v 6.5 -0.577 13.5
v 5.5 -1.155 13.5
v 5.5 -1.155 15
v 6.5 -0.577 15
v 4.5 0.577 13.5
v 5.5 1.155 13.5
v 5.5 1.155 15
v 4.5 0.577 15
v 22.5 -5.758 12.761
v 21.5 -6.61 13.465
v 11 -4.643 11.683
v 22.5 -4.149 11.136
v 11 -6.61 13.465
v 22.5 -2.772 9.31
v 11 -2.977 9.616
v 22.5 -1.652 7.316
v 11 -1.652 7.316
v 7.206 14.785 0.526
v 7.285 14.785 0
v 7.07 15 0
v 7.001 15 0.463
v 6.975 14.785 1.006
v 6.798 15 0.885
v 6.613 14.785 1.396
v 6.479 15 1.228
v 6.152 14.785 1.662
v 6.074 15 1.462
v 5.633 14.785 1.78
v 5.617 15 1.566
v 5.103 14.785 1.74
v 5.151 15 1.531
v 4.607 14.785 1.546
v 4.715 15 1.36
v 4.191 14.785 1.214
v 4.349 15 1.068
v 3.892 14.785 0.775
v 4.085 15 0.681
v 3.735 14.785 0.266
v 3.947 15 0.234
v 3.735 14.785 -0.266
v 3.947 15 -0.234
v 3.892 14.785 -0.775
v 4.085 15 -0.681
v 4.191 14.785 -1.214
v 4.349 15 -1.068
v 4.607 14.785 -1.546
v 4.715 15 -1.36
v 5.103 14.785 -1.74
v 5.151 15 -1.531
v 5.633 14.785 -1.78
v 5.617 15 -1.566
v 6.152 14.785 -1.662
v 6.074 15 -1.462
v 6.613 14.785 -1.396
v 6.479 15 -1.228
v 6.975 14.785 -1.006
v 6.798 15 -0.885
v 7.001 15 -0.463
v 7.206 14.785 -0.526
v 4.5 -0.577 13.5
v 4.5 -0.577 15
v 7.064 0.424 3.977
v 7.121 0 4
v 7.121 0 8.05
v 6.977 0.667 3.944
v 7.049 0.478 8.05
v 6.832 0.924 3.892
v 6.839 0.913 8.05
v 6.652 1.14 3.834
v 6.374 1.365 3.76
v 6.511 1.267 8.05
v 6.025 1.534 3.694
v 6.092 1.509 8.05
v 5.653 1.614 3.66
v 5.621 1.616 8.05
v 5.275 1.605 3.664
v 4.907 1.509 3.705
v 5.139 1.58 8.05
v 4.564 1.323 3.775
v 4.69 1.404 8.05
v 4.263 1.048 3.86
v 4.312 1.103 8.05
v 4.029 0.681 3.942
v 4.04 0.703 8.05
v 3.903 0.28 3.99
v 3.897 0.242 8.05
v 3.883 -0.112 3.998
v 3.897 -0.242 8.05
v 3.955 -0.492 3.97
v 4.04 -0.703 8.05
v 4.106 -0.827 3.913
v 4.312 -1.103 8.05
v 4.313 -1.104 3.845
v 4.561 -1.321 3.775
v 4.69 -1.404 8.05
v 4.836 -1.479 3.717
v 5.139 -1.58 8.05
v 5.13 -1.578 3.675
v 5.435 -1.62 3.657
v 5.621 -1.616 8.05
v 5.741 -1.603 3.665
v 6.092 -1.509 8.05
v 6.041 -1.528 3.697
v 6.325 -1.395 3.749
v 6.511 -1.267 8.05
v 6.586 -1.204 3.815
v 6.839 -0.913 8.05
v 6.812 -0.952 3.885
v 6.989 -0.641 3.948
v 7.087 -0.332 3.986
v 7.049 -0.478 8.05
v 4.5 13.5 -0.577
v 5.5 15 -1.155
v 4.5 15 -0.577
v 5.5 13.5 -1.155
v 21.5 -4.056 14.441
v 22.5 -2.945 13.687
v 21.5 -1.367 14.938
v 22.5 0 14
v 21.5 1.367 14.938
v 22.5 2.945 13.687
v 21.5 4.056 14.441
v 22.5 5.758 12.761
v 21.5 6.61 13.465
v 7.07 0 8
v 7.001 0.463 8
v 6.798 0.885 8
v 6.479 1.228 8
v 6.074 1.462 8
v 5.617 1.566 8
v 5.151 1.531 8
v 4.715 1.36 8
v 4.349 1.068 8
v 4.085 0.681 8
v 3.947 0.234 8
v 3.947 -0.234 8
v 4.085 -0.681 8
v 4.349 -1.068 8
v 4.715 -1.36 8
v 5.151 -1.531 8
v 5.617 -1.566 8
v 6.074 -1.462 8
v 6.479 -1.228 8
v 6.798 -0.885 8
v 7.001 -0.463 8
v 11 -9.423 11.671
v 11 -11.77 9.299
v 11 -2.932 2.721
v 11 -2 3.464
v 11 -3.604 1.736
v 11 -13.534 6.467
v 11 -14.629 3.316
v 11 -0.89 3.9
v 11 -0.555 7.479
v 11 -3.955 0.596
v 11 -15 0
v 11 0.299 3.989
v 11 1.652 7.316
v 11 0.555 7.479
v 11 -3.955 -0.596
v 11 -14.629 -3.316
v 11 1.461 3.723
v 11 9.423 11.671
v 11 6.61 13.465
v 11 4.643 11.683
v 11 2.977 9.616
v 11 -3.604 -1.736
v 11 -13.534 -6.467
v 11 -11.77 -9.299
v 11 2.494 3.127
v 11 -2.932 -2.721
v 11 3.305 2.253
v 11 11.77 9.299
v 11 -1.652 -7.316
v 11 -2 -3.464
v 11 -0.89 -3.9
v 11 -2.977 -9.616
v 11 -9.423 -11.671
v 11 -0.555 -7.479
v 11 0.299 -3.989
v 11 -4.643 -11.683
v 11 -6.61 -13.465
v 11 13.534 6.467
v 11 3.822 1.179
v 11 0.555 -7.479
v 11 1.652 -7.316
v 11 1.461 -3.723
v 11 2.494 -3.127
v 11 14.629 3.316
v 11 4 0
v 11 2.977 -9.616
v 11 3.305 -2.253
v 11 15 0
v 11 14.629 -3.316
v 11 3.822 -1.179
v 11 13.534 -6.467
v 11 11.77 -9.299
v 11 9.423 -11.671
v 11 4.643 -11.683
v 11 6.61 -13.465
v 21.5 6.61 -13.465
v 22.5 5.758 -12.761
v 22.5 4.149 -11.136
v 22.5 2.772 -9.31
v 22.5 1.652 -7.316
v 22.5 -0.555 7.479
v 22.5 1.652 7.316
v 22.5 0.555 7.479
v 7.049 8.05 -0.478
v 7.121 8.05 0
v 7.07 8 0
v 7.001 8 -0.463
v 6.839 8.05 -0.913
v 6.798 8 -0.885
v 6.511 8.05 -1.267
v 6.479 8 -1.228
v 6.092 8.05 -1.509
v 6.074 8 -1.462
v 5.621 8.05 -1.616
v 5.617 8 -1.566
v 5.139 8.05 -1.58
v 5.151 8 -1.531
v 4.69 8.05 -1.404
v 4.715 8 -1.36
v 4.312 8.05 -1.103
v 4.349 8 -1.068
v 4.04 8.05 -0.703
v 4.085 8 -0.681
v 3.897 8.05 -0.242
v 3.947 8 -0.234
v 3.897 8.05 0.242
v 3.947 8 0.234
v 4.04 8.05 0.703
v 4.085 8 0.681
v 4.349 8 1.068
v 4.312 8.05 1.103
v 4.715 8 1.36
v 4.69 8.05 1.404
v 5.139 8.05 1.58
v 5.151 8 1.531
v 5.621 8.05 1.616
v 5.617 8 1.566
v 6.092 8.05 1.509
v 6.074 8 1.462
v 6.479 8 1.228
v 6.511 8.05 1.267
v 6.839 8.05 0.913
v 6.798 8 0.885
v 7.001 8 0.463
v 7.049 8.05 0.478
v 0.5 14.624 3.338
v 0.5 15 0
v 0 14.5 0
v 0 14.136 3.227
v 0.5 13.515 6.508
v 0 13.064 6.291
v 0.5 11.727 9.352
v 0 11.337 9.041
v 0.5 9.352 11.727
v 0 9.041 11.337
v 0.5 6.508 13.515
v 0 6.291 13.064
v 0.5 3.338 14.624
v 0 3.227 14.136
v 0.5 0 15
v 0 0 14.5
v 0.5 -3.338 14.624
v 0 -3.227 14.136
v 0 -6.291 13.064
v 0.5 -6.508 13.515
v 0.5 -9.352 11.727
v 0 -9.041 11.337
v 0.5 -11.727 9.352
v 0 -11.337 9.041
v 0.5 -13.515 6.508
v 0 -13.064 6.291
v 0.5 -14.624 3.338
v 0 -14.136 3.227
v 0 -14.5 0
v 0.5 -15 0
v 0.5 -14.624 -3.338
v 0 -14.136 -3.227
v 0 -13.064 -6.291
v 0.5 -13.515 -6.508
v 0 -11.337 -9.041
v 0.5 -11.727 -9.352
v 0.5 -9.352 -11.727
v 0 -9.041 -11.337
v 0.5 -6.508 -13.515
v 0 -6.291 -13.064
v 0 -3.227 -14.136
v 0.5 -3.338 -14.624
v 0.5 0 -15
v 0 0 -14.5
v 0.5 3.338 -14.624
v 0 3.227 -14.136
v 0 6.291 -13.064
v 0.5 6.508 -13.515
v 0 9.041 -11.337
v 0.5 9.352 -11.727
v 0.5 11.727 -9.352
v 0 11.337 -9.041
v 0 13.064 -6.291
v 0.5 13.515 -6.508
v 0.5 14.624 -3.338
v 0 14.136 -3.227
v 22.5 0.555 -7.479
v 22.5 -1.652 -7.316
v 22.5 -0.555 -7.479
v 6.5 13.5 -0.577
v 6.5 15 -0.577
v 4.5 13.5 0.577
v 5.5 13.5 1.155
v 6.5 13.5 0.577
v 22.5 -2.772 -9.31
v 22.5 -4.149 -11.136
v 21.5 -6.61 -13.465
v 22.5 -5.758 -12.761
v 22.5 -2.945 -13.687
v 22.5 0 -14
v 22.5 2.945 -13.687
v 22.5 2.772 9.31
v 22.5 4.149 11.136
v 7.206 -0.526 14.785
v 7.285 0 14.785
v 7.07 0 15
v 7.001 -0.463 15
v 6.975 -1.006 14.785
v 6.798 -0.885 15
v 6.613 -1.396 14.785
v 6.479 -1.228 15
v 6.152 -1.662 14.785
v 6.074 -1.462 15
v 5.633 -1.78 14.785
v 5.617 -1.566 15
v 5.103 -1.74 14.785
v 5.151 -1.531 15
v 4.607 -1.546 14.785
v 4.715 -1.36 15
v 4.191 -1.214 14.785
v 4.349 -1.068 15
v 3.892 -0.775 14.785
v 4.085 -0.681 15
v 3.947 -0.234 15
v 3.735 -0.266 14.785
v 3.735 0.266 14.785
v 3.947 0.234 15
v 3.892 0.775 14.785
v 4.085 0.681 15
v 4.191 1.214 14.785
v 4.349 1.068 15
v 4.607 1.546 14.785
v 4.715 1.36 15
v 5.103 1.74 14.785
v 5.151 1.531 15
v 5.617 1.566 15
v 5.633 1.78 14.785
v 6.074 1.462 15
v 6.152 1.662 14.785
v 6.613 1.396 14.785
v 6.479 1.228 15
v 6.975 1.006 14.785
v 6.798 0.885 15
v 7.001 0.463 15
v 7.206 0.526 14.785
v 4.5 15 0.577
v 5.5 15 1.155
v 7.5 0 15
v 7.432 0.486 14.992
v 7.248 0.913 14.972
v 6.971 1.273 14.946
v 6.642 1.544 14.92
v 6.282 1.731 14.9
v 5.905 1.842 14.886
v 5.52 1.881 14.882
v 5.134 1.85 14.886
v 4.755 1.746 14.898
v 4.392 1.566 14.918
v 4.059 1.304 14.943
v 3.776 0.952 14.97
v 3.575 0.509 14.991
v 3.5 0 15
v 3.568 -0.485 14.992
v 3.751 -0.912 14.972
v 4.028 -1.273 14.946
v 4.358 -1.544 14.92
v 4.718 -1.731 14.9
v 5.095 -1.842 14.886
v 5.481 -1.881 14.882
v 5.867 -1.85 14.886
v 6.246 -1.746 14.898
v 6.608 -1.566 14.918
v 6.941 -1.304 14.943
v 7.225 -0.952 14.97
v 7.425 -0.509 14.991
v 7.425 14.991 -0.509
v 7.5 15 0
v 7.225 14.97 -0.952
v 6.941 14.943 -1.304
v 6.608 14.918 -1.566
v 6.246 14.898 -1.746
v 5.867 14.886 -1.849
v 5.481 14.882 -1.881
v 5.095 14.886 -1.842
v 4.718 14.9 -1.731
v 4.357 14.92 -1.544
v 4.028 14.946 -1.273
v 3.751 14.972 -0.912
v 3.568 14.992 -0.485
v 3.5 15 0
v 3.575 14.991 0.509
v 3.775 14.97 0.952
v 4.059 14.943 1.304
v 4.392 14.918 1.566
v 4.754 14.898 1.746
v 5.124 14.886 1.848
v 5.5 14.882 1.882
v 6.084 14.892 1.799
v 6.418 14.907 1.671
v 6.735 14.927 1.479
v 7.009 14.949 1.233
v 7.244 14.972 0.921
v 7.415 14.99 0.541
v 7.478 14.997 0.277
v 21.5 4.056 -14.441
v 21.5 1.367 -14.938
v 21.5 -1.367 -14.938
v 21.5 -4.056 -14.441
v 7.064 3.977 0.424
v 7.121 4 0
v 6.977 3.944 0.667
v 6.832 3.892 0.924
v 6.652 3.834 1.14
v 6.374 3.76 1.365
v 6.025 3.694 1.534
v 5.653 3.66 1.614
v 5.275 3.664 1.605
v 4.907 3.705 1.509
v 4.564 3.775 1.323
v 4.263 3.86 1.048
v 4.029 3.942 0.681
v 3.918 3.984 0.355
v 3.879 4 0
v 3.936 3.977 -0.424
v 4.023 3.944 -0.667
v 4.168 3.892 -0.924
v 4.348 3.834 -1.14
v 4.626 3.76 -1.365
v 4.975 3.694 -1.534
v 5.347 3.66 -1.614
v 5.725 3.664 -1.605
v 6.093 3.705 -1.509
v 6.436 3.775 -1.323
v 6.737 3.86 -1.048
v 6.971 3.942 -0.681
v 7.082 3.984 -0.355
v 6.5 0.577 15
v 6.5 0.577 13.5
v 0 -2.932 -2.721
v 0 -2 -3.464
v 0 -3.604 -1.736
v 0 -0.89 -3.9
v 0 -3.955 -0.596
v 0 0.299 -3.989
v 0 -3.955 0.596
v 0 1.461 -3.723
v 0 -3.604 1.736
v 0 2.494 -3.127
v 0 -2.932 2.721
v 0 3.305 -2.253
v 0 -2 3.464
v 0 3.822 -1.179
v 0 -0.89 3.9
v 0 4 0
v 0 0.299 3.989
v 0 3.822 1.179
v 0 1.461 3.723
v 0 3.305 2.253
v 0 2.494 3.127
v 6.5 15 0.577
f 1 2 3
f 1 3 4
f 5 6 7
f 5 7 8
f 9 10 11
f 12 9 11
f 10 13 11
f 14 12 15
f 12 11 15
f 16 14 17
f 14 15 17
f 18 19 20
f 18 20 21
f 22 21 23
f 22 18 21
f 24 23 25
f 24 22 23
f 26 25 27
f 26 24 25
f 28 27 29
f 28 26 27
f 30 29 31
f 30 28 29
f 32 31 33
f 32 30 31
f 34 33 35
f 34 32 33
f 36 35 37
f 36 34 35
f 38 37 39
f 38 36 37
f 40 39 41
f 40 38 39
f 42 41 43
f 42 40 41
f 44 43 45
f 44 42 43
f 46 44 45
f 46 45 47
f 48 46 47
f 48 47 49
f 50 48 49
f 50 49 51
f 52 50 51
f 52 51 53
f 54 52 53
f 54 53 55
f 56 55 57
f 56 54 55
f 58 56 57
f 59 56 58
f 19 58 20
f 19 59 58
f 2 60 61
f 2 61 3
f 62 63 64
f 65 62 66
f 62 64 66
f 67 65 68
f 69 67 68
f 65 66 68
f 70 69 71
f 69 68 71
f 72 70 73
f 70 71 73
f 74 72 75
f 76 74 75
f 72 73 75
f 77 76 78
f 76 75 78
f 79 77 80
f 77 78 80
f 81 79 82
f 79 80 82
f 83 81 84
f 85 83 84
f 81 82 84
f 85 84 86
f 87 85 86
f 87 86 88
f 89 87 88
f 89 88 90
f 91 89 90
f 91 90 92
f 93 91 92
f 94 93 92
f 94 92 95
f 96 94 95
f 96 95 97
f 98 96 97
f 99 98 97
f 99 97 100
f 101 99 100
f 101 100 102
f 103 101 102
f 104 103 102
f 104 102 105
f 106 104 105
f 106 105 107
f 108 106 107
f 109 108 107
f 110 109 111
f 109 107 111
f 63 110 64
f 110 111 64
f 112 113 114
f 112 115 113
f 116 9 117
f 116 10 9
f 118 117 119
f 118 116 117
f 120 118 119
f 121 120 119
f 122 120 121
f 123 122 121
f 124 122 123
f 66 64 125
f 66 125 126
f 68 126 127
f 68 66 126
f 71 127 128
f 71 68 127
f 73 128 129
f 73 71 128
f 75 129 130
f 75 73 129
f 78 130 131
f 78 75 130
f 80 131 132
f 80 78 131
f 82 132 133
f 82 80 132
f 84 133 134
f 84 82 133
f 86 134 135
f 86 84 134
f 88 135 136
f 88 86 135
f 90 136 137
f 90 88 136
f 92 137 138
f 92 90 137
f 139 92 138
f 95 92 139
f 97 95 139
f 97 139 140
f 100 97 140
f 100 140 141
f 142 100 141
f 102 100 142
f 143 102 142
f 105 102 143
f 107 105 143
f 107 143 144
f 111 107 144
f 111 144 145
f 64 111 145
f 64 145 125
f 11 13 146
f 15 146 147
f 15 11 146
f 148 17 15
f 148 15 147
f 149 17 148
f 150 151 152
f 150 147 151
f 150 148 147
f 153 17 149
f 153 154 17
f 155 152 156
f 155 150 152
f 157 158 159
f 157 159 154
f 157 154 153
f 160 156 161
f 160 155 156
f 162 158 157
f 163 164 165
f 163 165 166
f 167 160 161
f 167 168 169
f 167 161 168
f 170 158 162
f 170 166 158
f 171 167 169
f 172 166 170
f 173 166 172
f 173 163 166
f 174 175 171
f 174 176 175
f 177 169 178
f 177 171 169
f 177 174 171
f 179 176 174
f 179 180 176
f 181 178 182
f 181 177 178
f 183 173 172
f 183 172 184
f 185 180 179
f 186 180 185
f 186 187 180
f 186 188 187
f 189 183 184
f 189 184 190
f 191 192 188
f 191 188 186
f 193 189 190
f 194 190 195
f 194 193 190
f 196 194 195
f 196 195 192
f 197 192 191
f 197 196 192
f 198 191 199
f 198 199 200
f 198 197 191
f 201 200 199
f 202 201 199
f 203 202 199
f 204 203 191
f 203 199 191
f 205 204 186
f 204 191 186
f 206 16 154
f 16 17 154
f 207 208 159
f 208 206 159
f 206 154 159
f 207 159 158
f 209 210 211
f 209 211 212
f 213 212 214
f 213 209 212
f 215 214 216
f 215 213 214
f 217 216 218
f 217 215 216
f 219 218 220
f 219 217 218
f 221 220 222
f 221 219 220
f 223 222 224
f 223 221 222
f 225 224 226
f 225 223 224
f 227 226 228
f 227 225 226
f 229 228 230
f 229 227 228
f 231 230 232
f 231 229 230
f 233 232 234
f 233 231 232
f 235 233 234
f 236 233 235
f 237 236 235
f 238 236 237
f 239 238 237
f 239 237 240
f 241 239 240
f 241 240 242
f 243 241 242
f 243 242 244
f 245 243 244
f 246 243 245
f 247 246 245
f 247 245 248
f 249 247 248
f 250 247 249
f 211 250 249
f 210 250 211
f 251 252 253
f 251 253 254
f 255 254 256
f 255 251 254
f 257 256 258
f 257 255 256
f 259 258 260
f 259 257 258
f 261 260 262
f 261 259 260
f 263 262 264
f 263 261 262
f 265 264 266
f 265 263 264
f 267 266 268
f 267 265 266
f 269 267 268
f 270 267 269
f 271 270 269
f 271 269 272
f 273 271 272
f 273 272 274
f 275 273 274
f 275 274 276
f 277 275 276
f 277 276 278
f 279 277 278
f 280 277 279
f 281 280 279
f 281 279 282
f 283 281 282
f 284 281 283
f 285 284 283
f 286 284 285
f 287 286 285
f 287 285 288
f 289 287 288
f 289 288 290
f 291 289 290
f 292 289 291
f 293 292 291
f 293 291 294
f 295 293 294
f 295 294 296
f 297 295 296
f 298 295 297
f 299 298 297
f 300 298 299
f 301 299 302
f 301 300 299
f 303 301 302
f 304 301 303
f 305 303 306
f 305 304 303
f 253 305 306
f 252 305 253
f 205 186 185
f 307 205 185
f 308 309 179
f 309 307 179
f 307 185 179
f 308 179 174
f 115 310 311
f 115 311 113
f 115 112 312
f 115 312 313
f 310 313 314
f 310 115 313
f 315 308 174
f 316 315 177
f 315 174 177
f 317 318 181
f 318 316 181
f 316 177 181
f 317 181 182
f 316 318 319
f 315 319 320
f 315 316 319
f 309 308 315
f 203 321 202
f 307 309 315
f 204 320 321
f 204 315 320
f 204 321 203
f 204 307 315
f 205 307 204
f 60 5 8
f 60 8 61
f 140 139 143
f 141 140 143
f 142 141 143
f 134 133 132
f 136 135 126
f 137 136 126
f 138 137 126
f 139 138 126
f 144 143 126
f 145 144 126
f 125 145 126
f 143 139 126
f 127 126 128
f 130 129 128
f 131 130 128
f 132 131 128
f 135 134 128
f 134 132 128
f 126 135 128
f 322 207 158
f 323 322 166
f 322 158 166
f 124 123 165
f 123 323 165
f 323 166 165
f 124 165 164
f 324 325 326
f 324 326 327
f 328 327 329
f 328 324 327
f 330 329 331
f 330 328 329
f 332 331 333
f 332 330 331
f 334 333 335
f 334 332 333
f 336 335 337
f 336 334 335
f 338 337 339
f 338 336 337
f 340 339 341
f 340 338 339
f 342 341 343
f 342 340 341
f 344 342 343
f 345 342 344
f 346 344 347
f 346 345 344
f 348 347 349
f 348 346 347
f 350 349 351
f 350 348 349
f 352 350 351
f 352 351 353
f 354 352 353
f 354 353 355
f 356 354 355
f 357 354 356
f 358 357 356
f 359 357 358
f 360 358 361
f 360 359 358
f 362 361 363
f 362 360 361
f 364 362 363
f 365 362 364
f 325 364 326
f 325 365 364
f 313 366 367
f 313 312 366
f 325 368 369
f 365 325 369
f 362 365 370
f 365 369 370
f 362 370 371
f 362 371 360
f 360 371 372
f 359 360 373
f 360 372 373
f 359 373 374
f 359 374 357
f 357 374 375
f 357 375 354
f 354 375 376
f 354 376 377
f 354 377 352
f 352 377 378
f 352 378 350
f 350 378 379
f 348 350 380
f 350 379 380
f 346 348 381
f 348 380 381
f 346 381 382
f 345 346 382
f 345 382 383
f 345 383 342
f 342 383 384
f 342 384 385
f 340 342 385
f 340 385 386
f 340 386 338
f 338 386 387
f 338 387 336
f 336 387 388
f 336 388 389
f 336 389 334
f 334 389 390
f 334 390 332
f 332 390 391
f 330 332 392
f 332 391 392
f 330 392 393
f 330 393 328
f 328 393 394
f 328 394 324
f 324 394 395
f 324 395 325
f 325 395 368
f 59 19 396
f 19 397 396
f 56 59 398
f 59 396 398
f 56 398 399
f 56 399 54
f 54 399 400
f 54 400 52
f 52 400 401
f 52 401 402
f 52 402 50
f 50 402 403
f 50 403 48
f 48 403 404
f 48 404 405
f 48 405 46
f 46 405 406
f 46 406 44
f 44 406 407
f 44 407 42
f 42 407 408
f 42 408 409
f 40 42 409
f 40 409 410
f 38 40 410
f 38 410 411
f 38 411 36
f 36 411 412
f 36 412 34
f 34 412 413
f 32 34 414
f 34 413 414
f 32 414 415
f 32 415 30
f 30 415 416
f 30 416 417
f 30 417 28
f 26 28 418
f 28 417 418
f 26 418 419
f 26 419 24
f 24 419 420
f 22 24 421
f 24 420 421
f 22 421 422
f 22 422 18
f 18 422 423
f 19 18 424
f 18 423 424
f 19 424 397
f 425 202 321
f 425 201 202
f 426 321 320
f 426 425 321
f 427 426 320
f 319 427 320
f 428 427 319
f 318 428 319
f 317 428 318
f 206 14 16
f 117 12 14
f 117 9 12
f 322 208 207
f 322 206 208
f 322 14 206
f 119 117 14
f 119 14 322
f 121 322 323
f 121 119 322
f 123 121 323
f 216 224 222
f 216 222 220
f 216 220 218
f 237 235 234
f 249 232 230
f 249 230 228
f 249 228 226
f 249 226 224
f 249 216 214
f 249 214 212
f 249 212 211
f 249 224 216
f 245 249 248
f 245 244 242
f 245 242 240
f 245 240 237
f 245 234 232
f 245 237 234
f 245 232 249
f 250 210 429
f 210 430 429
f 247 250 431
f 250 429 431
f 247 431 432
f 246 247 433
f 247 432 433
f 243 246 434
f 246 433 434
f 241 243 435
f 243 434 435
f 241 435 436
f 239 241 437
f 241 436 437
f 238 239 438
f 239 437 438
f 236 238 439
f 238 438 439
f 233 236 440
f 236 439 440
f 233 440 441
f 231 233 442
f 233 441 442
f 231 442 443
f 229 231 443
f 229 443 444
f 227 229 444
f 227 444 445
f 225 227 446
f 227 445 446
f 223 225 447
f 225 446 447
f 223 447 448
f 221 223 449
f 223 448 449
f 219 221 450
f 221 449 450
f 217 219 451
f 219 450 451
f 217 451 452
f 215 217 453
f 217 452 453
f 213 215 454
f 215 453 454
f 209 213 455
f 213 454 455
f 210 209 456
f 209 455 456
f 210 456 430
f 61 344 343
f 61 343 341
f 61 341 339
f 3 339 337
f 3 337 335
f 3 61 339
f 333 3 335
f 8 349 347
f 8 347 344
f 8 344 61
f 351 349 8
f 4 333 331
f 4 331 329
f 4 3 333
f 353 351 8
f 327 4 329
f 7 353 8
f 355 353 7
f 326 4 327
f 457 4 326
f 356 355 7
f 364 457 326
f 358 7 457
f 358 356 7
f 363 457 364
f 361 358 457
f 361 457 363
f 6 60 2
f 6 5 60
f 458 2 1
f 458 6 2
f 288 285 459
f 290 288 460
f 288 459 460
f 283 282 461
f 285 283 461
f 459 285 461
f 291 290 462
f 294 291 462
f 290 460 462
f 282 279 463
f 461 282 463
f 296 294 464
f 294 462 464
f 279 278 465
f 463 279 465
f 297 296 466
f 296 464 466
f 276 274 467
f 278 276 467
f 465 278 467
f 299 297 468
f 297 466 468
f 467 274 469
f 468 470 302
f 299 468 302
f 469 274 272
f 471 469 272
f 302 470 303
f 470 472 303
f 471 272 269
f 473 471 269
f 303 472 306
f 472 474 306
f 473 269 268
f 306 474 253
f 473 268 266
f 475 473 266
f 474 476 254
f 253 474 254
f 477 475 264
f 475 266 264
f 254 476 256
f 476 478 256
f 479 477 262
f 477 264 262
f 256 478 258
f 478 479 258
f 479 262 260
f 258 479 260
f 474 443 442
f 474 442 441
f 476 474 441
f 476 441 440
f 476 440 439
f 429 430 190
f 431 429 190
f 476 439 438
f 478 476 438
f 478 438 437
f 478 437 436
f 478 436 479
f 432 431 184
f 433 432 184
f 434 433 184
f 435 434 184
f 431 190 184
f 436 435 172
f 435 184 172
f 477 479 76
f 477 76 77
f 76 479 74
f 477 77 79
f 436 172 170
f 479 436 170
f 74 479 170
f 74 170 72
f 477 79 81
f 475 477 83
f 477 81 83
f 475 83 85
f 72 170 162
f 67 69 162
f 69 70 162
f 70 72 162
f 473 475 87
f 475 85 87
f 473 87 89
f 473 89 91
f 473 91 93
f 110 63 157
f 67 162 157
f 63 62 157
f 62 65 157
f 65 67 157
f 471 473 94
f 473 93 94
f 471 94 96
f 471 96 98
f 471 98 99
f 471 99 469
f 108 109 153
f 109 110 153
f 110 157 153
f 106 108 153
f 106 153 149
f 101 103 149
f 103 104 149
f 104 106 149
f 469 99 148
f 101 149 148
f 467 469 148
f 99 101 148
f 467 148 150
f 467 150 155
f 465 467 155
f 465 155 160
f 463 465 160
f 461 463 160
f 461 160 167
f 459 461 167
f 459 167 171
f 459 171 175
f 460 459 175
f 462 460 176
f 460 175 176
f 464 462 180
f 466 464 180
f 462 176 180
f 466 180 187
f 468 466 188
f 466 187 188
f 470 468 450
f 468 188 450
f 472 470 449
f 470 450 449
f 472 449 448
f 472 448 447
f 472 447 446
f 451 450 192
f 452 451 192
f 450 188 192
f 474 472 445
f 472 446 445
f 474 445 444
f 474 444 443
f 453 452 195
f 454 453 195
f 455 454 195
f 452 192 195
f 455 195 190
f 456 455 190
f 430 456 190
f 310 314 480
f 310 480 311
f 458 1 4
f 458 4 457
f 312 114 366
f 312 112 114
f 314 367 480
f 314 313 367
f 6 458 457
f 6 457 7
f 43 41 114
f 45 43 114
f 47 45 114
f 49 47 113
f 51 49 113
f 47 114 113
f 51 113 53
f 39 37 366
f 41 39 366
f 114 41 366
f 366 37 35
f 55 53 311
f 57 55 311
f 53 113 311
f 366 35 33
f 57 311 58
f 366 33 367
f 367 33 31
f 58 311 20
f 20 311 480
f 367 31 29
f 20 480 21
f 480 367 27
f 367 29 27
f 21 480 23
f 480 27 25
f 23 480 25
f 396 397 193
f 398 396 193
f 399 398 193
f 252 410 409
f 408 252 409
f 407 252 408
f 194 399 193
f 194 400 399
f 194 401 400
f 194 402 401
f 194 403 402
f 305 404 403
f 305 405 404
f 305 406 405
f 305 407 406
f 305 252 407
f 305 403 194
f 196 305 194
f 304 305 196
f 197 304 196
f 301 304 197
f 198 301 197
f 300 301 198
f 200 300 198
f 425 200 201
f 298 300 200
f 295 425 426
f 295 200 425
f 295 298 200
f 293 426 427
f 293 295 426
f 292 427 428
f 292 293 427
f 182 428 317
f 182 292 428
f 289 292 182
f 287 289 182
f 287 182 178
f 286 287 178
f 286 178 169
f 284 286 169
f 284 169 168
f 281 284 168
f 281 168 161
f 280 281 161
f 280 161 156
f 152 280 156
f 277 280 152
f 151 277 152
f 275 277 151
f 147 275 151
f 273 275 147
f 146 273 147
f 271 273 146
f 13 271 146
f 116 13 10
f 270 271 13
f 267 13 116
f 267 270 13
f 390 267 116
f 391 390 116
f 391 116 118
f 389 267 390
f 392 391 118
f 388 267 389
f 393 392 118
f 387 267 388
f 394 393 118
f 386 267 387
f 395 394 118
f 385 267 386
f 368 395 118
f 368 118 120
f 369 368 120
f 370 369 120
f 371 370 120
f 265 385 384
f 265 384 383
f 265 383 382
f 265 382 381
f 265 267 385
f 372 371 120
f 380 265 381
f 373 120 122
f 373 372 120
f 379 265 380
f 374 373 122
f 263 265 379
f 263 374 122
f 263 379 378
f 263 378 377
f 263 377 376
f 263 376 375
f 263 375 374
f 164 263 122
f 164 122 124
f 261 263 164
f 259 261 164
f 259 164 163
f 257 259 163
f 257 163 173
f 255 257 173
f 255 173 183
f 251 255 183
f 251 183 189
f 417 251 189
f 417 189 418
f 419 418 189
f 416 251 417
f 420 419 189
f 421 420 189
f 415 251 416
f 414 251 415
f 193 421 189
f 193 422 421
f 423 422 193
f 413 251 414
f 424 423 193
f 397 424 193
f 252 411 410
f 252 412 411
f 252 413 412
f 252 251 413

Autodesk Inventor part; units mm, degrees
sketch "Sketch_1" plane through (0, 0, 0) normal (0, 0, 1) x (1, 0, 0)
  line L0 (22.5, 0) -> (0, 0)
  line L1 (0, 14.5) -> (0, 4)
  line L2 (0, 4) -> (22.5, 4)
  line L3 (22.5, 4) -> (22.5, 14)
  line L4 (22.5, 14) -> (21.5, 15)
  line L5 (21.5, 15) -> (0.5, 15)
  line L6 (0.5, 15) -> (0, 14.5)
revolve "Revolution1" add sketch "Sketch_1" angle 360 about axis through (22.5, 0, 0) along (1, 0, 0)
sketch "Sketch_2" plane through (11, 0, 0) normal (1, 0, 0) x (0, 0, -1)
  arc A0 (-13.4651, -6.61) -> (13.4651, -6.61) centre (0, 0) ccw
  arc A1 (13.4651, -6.61) -> (7.3157, -1.6525) centre (0, -17.0197) ccw
  arc A2 (7.3157, -1.6525) -> (7.3157, 1.6525) centre (0, 0) ccw
  arc A3 (7.3157, 1.6525) -> (13.4651, 6.61) centre (0, 17.0197) ccw
  arc A4 (13.4651, 6.61) -> (-13.4651, 6.61) centre (0, 0) ccw
  arc A5 (-13.4651, 6.61) -> (-7.3157, 1.6525) centre (0, 17.0197) ccw
  arc A6 (-7.3157, 1.6525) -> (-7.3157, -1.6525) centre (0, 0) ccw
  arc A7 (-7.3157, -1.6525) -> (-13.4651, -6.61) centre (0, -17.0197) ccw
extrude "Extrusion1" cut sketch "Sketch_2" along normal blind 11.5
sketch "Sketch_7" plane through (0, 0, 0) normal (0, 0, 1) x (1, 0, 0)
  line L0 (5.5, 0) -> (5.5, 15)
  line L1 (5.5, 15) -> (7.5, 15)
  line L2 (7.5, 15) -> (7.121, 14.621)
  line L3 (7.121, 14.621) -> (7.121, 0.379)
  line L4 (7.121, 0.379) -> (7.5, 0)
  line L5 (7.5, 0) -> (5.5, 0)
  line L6 (5.5, 0) -> (5.5, 15)
revolve "Revolution2" cut sketch "Sketch_7" angle 360 about axis through (5.5, 0, 0) along (0, -1, 0)
sketch "Sketch_8" plane through (0, 0, 0) normal (0, 1, 0) x (-1, 0, 0)
  line L0 (-5.5, 15) -> (-5.5, 0)
  line L1 (-5.5, 0) -> (-7.5, 0)
  line L2 (-7.5, 0) -> (-7.121, 0.379)
  line L3 (-7.121, 0.379) -> (-7.121, 14.621)
  line L4 (-7.121, 14.621) -> (-7.5, 15)
  line L5 (-7.5, 15) -> (-5.5, 15)
  line L6 (-5.5, 15) -> (-5.5, 0)
revolve "Revolution3" cut sketch "Sketch_8" angle 360 about axis through (5.5, 0, 15) along (0, 0, 1)
sketch "Sketch_12" plane through (0, 0, 0) normal (0, 0, 1) x (1, 0, 0)
  line L0 (5.5, 8) -> (5.5, 15)
  line L1 (5.5, 15) -> (7.0705, 15)
  line L2 (7.0705, 15) -> (7.5, 14.5705)
  line L3 (7.5, 14.5705) -> (7.5, 8.4295)
  line L4 (7.5, 8.4295) -> (7.0705, 8)
  line L5 (7.0705, 8) -> (5.5, 8)
  line L6 (5.5, 8) -> (5.5, 15)
revolve "Revolution4" add sketch "Sketch_12" angle 360 about axis through (5.5, 8, 0) along (0, -1, 0)
sketch "Sketch_13" plane through (0, 0, 0) normal (0, 1, 0) x (-1, 0, 0)
  line L0 (-5.5, 15) -> (-5.5, 8)
  line L1 (-5.5, 8) -> (-7.0705, 8)
  line L2 (-7.0705, 8) -> (-7.5, 8.4295)
  line L3 (-7.5, 8.4295) -> (-7.5, 14.5705)
  line L4 (-7.5, 14.5705) -> (-7.0705, 15)
  line L5 (-7.0705, 15) -> (-5.5, 15)
  line L6 (-5.5, 15) -> (-5.5, 8)
revolve "Revolution5" add sketch "Sketch_13" angle 360 about axis through (5.5, 0, 15) along (0, 0, 1)
sketch "Sketch_14" plane through (0, 13.5, 0) normal (0, 1, 0) x (1, 0, 0)
  line L0 (4.5, -0.5774) -> (5.5, -1.1547)
  line L1 (5.5, -1.1547) -> (6.5, -0.5774)
  line L2 (6.5, -0.5774) -> (6.5, 0.5774)
  line L3 (6.5, 0.5774) -> (5.5, 1.1547)
  line L4 (5.5, 1.1547) -> (4.5, 0.5774)
  line L5 (4.5, 0.5774) -> (4.5, -0.5774)
extrude "Extrusion2" cut sketch "Sketch_14" along normal blind 1.5
sketch "Sketch_15" plane through (0, 0, 13.5) normal (0, 0, 1) x (1, 0, 0)
  line L0 (4.5, -0.5774) -> (5.5, -1.1547)
  line L1 (5.5, -1.1547) -> (6.5, -0.5774)
  line L2 (6.5, -0.5774) -> (6.5, 0.5774)
  line L3 (6.5, 0.5774) -> (5.5, 1.1547)
  line L4 (5.5, 1.1547) -> (4.5, 0.5774)
  line L5 (4.5, 0.5774) -> (4.5, -0.5774)
extrude "Extrusion3" cut sketch "Sketch_15" along normal blind 1.5
ref_plane "part1a_XY" through (0, 0, 0) normal (1, 0, 0) x (0, 0, -1)
ref_plane "part1a_YZ" through (0, 0, 0) normal (0, 0, -1) x (0, 1, 0)
ref_plane "part1a_ZX" through (0, 0, 0) normal (0, 1, 0) x (1, 0, 0)
ref_plane "part1b_XY" through (12.5, 0, 0) normal (1, 0, 0) x (0, 0, -1)
ref_plane "part1b_YZ" through (12.5, 0, 0) normal (0, 0, -1) x (0, 1, 0)
ref_plane "part1b_ZX" through (12.5, 0, 0) normal (0, 1, 0) x (1, 0, 0)
ref_plane "part1c_XY" through (22.5, 0, 0) normal (1, 0, 0) x (0, 0, -1)
ref_plane "part1c_YZ" through (22.5, 0, 0) normal (0, 0, -1) x (0, 1, 0)
ref_plane "part1c_ZX" through (22.5, 0, 0) normal (0, 1, 0) x (1, 0, 0)
properties part number "MJT-30-BL-8-12 Hub 1"
